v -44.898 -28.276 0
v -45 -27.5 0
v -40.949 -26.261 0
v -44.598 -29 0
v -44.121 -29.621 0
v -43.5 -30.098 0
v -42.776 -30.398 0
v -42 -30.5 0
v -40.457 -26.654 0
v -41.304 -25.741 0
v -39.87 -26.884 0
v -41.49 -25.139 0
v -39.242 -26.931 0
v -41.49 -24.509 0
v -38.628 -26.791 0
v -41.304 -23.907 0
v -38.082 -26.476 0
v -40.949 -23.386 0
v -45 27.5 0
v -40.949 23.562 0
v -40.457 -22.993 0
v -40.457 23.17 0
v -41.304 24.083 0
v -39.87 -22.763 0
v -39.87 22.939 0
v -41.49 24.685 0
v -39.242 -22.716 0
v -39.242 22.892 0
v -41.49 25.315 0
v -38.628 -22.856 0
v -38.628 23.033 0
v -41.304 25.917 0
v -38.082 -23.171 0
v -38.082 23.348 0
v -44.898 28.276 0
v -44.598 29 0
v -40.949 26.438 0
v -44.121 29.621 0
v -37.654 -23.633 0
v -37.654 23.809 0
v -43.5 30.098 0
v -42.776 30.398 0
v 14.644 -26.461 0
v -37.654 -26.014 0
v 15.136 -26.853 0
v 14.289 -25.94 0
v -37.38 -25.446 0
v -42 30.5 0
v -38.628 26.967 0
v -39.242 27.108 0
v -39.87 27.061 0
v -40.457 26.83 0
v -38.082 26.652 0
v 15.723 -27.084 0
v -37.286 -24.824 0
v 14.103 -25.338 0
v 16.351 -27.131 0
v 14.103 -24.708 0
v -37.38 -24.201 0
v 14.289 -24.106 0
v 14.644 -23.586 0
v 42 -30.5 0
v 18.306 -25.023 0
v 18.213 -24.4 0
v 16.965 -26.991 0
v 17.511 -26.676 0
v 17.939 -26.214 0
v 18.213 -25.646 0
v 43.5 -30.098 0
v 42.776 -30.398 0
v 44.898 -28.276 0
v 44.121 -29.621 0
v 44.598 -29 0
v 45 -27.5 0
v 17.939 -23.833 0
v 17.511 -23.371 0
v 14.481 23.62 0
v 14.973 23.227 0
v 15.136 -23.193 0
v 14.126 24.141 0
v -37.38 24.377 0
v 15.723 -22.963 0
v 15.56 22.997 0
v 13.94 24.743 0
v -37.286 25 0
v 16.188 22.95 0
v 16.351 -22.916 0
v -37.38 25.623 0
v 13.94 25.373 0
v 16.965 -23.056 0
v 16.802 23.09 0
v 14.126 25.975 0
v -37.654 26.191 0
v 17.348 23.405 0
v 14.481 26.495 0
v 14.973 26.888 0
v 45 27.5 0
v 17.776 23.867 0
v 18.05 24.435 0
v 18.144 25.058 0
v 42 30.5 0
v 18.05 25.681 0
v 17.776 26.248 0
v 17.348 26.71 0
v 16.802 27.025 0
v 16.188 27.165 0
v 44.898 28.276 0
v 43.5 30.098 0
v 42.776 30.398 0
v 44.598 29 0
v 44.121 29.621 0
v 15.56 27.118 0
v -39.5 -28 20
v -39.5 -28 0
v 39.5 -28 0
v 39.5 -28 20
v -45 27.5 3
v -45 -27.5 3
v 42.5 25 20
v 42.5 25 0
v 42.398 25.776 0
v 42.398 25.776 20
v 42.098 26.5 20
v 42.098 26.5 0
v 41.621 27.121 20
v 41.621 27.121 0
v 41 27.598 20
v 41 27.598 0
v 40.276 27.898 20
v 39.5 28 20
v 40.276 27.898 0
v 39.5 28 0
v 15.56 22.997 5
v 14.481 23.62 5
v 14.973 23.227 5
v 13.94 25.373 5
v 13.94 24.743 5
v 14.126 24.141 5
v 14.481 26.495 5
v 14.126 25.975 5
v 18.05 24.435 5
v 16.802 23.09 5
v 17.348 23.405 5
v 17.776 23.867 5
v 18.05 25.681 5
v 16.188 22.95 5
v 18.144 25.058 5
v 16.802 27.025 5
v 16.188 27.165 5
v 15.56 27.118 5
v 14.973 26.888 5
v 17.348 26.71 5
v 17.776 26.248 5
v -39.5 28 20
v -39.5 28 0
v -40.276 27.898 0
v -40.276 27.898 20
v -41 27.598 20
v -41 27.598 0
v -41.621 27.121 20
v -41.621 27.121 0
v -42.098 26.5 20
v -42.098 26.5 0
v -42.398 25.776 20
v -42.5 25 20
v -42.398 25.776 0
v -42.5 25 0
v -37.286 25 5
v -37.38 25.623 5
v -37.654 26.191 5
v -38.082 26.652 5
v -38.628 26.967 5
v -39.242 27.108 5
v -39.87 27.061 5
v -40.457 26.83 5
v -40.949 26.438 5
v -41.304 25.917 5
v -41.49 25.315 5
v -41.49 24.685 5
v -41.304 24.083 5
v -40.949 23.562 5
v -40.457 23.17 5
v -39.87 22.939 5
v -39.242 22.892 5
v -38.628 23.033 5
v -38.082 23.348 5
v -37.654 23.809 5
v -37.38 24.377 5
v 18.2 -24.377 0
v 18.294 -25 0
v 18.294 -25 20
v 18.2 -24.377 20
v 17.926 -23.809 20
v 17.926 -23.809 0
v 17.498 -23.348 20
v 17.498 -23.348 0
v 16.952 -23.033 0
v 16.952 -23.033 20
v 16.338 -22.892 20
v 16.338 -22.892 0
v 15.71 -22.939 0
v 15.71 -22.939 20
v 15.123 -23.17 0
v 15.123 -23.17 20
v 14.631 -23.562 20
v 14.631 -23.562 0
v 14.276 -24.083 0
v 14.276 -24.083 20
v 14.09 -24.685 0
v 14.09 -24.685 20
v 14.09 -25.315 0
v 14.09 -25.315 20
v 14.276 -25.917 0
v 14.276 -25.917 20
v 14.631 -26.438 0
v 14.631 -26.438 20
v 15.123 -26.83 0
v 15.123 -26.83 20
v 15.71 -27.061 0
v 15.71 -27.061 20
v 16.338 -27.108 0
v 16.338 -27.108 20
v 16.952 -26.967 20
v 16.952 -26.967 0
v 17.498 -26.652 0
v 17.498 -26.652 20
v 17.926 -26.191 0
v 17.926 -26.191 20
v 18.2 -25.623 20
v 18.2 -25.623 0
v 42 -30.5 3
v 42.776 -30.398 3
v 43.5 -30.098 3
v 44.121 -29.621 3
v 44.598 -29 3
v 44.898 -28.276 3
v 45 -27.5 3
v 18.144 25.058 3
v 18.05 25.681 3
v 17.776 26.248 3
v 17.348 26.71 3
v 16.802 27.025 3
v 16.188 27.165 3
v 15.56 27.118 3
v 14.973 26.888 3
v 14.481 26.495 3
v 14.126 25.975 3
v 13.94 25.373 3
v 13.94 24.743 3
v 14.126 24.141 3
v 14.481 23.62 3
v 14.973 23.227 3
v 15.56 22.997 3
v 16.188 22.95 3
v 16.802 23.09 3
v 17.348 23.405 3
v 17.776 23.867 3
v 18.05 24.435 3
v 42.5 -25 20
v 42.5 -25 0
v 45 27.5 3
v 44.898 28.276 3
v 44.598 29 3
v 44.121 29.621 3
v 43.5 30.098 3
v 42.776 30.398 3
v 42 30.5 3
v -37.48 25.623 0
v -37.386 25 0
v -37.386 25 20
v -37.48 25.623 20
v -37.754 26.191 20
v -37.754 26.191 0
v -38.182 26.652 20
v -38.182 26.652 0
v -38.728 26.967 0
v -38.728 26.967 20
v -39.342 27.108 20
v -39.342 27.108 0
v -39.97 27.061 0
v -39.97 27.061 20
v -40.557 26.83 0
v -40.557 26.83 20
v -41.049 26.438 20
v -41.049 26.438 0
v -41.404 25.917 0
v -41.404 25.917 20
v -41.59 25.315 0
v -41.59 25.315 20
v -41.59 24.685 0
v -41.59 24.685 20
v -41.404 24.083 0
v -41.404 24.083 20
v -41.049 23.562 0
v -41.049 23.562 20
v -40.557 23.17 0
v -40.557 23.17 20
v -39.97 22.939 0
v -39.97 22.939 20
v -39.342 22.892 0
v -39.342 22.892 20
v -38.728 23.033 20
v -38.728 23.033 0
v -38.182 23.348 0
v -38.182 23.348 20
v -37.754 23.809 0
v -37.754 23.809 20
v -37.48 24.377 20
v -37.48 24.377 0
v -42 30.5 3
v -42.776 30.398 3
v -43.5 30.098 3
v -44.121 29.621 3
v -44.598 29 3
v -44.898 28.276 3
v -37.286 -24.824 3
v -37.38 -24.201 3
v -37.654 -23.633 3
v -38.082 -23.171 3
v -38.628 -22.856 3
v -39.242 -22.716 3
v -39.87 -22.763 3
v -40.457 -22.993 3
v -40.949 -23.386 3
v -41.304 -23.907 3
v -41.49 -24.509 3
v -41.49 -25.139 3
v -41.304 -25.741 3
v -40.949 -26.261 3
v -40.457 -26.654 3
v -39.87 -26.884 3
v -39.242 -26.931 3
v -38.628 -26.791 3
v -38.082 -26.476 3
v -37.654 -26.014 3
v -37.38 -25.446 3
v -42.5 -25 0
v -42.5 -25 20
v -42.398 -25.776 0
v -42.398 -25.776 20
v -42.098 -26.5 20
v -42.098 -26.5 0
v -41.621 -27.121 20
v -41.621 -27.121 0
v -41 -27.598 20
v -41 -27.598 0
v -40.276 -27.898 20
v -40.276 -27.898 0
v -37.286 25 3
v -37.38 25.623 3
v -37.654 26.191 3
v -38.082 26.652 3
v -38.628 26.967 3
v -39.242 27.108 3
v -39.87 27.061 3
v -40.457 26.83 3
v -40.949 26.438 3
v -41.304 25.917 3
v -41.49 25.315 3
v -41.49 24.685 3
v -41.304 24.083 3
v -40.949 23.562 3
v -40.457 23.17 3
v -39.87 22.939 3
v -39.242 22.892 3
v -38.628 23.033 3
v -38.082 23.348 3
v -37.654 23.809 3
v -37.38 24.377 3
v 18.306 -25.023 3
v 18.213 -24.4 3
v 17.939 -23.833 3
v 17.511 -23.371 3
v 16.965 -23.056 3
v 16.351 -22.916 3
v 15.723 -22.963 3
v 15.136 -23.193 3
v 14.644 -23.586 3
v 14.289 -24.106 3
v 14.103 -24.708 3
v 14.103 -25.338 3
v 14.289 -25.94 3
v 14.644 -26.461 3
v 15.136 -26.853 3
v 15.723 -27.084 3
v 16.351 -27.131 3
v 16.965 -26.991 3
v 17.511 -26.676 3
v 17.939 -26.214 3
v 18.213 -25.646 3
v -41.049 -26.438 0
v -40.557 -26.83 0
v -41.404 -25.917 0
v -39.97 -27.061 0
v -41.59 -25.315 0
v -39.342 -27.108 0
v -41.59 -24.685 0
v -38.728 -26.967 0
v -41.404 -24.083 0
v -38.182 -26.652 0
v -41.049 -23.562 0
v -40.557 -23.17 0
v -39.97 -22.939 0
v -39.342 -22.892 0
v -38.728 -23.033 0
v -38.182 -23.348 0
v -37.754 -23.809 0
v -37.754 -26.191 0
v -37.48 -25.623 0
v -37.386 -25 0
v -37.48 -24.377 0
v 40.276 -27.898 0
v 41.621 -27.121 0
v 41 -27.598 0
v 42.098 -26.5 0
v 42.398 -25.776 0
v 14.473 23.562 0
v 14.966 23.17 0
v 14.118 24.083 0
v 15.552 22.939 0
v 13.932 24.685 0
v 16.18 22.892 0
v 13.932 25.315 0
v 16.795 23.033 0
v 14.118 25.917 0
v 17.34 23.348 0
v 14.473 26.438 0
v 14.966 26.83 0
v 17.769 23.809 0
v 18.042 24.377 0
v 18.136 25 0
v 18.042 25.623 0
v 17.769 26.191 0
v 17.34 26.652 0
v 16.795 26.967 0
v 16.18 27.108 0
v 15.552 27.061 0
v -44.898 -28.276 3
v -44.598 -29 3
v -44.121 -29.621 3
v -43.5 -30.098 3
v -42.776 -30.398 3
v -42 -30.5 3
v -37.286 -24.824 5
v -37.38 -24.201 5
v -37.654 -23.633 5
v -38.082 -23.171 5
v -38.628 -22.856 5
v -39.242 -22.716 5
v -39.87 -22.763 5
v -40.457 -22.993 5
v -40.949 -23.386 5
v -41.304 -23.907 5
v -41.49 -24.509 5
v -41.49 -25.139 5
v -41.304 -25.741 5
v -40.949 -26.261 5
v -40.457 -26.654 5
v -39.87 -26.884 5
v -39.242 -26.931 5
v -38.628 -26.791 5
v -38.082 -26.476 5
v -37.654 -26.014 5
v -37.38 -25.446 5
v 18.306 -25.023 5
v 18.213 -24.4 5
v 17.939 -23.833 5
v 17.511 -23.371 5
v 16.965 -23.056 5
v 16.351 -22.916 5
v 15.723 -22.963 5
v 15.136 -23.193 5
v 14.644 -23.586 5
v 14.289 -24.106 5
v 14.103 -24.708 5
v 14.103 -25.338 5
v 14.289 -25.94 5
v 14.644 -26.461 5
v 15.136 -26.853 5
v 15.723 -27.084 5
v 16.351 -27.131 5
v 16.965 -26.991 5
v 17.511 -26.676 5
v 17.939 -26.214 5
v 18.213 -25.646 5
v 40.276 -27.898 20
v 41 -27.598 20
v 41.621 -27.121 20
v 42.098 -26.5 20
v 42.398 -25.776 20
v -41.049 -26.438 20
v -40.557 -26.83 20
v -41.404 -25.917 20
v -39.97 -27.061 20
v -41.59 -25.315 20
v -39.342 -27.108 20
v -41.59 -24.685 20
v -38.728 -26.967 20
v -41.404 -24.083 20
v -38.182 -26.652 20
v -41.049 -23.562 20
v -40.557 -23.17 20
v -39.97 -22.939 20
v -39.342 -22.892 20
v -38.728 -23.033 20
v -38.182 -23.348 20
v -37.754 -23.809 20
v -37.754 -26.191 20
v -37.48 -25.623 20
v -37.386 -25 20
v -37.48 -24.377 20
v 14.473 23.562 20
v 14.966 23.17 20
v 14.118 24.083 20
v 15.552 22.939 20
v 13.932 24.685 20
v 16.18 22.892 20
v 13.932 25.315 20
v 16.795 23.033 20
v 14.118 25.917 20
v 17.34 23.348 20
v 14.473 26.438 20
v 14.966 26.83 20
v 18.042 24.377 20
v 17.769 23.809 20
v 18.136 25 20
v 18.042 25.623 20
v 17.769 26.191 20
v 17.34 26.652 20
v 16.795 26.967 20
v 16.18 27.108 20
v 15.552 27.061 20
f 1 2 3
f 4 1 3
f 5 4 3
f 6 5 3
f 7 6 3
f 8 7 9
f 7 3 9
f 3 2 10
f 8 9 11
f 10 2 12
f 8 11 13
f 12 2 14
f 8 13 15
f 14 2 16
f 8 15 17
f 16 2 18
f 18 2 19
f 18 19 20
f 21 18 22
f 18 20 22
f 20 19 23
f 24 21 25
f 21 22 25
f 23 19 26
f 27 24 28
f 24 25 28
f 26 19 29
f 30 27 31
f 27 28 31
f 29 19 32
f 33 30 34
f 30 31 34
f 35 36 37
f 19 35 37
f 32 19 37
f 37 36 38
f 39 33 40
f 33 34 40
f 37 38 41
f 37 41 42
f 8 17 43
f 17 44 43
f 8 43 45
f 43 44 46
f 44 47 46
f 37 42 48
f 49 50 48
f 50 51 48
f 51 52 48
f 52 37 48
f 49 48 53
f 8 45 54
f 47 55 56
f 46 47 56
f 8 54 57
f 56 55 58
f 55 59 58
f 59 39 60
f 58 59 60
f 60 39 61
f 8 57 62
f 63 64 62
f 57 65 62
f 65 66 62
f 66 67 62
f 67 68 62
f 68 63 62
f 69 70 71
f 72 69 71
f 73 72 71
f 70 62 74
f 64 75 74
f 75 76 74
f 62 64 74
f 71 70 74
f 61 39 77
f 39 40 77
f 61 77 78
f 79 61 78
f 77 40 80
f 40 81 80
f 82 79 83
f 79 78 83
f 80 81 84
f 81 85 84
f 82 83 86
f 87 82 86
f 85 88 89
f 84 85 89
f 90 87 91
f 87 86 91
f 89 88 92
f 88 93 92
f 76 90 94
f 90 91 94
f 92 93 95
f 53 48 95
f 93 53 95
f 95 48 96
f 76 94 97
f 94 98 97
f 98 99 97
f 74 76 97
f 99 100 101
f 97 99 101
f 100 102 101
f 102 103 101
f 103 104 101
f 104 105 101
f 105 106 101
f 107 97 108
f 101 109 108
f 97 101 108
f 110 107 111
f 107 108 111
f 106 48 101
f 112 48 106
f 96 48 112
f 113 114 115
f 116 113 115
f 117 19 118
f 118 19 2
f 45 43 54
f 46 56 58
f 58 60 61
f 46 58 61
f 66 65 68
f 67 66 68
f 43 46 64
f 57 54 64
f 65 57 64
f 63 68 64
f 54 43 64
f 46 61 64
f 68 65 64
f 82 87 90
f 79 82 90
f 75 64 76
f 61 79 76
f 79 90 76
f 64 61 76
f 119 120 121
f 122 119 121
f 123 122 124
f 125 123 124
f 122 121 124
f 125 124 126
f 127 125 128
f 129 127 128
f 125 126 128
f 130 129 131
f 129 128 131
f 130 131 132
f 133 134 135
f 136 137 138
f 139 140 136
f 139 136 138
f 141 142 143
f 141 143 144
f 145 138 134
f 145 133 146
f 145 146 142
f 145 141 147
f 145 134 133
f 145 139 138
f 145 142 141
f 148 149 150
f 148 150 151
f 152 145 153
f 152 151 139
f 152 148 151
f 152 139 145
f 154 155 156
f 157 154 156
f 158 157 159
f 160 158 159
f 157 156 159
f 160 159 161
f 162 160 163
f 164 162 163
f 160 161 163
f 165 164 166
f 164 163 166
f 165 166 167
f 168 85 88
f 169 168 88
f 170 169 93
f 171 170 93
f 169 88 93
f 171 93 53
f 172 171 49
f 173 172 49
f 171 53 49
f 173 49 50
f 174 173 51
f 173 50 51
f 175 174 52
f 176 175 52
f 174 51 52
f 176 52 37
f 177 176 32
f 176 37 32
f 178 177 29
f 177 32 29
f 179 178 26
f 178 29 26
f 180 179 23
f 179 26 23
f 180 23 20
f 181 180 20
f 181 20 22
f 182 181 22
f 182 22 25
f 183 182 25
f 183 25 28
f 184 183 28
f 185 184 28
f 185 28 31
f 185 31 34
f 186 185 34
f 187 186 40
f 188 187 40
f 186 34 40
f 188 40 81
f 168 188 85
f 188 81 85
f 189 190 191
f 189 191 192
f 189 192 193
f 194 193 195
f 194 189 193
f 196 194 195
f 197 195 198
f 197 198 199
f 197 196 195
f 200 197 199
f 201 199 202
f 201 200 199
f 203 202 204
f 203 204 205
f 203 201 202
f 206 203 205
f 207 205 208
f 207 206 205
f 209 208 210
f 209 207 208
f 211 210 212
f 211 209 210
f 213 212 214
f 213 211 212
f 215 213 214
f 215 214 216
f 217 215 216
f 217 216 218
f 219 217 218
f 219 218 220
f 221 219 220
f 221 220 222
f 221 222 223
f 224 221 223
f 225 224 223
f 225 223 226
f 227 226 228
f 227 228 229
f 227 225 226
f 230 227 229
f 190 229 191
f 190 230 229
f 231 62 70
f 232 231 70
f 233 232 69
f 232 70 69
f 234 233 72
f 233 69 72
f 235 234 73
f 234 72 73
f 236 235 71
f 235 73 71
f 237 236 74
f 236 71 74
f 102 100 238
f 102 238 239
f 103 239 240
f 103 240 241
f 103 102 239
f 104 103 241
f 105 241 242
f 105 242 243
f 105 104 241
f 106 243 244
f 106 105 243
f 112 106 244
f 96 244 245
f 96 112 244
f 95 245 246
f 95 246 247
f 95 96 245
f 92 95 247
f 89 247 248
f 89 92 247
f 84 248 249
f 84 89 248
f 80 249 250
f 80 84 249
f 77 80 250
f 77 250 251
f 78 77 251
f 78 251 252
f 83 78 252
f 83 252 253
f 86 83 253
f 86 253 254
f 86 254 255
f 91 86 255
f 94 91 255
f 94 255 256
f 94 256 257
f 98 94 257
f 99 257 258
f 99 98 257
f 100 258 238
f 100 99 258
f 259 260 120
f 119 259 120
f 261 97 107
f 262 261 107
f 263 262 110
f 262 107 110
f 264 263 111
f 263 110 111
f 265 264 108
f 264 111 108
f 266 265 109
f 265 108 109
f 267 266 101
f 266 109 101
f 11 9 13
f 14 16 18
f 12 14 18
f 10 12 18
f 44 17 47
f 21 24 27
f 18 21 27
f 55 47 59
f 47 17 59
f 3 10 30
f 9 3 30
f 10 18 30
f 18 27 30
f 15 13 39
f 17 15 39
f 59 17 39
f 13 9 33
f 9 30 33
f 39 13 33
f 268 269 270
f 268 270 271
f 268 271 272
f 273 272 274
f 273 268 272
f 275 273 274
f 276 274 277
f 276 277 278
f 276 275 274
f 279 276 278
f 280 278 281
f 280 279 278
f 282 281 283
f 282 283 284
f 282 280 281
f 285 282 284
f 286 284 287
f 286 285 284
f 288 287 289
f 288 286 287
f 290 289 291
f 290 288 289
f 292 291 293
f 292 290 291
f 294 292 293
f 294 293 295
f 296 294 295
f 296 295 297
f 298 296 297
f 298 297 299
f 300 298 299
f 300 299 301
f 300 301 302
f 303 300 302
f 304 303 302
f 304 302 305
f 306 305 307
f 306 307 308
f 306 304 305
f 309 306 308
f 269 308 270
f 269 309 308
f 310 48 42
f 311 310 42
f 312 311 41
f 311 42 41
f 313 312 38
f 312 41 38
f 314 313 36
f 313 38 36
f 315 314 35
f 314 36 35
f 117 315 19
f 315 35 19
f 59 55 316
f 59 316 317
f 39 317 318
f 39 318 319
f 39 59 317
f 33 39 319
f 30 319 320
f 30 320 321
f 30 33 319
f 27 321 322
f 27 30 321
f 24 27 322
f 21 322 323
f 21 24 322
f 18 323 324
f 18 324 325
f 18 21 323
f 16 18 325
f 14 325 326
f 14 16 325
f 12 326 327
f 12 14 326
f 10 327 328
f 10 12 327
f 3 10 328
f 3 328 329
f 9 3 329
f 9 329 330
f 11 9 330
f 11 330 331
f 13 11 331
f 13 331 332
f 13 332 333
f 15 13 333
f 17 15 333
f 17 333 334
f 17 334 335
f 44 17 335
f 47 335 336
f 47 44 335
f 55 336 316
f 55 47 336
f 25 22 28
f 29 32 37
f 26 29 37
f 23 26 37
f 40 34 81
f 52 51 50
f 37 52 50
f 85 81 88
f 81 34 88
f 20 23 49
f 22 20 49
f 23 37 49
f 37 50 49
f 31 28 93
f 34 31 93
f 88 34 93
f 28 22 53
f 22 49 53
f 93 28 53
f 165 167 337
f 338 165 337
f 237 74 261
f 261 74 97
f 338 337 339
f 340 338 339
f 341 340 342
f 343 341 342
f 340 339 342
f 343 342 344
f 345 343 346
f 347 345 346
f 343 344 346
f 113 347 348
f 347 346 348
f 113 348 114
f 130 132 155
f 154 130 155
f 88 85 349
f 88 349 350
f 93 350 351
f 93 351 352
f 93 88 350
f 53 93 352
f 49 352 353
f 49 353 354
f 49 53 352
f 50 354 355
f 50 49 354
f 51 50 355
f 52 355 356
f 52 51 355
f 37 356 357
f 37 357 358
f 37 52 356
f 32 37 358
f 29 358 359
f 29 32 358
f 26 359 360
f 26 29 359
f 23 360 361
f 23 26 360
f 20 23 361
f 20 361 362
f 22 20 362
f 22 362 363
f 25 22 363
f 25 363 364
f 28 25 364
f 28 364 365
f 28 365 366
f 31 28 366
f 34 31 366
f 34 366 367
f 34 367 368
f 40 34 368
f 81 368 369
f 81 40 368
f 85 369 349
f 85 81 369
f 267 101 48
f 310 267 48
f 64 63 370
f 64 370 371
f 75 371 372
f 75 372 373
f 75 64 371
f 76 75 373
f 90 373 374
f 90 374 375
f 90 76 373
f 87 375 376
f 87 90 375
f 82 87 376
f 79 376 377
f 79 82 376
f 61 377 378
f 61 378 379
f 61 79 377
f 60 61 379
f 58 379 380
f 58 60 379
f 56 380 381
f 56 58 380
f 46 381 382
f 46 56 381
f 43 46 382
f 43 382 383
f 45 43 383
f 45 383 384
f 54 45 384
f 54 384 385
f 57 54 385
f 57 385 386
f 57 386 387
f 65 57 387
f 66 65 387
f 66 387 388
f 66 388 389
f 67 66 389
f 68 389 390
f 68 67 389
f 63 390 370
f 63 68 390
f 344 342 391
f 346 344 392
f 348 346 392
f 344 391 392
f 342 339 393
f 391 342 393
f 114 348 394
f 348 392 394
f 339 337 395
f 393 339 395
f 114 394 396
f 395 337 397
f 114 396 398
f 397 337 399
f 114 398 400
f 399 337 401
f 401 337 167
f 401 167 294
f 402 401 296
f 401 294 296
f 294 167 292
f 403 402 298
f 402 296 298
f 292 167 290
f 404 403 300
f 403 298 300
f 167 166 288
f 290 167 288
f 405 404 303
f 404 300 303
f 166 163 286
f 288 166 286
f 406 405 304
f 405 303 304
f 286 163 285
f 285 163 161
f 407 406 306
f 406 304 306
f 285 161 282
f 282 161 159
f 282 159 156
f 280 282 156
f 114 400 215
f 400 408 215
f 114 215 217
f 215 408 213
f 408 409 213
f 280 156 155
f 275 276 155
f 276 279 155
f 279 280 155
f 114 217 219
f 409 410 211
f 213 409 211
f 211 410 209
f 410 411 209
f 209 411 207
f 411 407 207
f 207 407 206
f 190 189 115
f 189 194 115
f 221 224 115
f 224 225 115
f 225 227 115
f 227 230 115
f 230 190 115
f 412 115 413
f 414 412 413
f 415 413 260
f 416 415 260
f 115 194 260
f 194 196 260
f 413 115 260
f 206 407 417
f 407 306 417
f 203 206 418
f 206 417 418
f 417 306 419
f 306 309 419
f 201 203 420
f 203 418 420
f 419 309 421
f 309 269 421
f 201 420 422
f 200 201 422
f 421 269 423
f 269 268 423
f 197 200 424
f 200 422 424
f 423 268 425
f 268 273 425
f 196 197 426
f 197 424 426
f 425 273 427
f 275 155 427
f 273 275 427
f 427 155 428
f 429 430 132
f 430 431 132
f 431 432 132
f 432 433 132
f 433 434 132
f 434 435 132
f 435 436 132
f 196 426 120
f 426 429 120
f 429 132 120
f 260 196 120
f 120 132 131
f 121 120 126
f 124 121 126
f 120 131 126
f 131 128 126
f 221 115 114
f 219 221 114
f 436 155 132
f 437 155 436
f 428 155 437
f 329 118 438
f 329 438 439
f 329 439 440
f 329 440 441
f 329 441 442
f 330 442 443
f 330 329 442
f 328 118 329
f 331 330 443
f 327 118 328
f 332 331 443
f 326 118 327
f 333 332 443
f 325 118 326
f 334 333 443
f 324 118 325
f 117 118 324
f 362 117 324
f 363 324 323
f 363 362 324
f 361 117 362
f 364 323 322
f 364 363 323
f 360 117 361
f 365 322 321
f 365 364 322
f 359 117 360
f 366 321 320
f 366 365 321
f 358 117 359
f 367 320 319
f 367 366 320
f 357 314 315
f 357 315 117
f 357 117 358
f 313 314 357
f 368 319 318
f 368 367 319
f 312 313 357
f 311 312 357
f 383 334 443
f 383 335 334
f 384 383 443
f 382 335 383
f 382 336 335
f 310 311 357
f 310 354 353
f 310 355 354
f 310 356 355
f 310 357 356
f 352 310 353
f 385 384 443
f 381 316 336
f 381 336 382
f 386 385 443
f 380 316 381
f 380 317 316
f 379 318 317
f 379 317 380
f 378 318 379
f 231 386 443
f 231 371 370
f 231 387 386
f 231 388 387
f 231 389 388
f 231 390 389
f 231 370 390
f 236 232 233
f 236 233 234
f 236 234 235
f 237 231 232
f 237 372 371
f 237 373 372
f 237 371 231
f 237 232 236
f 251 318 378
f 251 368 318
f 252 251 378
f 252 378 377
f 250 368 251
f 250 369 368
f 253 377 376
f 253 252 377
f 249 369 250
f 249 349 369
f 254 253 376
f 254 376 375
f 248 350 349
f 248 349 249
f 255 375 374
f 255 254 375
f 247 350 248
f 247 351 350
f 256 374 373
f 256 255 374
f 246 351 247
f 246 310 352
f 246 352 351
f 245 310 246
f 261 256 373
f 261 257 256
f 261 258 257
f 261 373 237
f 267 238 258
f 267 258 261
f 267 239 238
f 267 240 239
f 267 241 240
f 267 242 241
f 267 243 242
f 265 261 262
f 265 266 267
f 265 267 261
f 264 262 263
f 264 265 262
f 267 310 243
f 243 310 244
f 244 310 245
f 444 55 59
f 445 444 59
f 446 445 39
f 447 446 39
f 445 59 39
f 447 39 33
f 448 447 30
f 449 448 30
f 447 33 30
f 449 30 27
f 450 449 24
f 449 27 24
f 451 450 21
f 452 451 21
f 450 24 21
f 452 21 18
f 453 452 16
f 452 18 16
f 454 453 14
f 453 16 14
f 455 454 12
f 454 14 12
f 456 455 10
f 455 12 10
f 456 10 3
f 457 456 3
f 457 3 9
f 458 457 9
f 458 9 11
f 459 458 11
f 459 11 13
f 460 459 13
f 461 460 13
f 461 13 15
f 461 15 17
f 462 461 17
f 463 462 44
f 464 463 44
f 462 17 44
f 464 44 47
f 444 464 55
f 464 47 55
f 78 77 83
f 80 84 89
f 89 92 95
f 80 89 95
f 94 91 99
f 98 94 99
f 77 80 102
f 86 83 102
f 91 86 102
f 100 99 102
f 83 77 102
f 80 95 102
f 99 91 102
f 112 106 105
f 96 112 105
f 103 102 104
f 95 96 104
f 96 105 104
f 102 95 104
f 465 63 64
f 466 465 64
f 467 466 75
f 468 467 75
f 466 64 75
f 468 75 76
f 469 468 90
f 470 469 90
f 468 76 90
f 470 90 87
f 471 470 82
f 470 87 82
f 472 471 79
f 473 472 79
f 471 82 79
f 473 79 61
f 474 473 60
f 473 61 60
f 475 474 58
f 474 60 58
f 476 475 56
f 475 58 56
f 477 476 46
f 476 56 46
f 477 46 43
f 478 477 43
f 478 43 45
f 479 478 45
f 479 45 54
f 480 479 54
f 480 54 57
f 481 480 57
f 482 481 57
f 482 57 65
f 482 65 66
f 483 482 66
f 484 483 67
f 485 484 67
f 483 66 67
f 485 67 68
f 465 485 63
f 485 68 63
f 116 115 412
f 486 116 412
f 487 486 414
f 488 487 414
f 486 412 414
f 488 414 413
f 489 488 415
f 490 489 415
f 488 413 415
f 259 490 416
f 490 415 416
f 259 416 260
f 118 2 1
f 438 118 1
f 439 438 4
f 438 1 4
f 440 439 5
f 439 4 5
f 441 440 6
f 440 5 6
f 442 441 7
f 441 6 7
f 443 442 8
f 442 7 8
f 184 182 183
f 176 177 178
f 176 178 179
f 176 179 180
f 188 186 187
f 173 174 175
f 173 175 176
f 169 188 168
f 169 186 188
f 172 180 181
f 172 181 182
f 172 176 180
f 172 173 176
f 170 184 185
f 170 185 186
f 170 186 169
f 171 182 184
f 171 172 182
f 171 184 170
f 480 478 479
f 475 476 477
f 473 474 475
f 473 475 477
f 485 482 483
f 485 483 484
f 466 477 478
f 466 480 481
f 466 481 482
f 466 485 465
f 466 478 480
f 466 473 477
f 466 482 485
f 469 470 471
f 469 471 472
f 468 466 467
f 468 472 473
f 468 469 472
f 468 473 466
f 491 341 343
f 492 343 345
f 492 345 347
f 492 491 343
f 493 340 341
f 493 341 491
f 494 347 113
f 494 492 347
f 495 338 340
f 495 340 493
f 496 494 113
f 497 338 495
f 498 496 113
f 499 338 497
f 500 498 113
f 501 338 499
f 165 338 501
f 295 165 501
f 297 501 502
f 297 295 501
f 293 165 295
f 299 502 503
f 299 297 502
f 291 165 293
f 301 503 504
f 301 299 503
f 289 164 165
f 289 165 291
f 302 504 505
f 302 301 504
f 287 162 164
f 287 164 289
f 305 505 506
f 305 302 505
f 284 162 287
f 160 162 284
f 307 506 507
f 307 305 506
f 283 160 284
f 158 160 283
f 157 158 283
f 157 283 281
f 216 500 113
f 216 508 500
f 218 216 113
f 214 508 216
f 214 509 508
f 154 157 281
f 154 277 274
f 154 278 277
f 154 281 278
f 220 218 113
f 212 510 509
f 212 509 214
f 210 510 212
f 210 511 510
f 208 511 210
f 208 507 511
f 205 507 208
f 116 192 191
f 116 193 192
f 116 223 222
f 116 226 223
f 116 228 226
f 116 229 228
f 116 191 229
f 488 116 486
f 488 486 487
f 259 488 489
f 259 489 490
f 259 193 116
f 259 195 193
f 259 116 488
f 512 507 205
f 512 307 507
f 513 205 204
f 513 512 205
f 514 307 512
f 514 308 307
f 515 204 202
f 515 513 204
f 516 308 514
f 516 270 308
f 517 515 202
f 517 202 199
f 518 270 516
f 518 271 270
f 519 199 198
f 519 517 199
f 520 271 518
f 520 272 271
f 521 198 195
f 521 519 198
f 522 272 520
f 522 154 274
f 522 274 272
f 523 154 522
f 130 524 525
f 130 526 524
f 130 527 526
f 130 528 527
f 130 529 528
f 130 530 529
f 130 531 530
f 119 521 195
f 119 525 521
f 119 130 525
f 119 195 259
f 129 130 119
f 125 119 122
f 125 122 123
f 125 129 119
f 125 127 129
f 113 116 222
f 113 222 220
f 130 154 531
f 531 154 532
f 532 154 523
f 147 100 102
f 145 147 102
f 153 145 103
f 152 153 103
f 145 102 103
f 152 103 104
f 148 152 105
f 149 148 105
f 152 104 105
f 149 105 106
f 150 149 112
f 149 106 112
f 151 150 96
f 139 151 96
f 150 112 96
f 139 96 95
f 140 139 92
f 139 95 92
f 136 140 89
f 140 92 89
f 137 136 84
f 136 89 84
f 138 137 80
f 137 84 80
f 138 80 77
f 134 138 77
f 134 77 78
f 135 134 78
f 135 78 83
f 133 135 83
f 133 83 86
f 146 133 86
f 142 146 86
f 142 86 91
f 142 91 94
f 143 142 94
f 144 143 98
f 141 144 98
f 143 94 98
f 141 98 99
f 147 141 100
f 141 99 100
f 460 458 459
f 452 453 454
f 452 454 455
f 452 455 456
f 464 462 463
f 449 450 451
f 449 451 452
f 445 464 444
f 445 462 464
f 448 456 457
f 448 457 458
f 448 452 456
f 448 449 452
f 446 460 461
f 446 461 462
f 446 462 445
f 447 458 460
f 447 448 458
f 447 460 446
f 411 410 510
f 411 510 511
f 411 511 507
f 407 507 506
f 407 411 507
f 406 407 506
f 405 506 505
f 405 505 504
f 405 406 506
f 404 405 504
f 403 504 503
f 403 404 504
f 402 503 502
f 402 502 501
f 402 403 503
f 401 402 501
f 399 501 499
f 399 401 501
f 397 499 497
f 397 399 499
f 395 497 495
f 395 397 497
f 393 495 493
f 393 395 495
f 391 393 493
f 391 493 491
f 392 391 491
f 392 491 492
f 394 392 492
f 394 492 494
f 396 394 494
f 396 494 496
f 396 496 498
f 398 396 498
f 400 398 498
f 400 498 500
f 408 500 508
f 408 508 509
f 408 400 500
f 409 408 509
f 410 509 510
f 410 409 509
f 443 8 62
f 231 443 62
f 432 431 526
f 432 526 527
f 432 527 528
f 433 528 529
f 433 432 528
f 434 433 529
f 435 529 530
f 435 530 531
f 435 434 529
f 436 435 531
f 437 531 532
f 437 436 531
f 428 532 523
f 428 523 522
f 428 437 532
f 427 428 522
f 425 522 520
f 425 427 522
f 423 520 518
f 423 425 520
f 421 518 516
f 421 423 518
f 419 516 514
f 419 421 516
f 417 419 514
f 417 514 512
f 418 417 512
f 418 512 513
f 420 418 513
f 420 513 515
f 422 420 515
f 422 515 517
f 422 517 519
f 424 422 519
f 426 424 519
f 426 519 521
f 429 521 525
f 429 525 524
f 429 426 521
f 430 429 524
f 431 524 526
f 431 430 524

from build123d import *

# Parameters (mm, degrees)
F0_R     = 2.113509
F1_DEPTH = 20
F2_R     = 2.113509
F3_DEPTH = 5
F4_DEPTH = 3


with BuildPart() as f1:
    # F0 (on Top) → F1 (new body)
    with BuildSketch(Plane.XY):
        with BuildLine():
            ThreePointArc((-42.5, -25), (-41.62132, -27.12132), (-39.5, -28))
            Line((-39.5, -28), (39.5, -28))
            ThreePointArc((39.5, -28), (41.62132, -27.12132), (42.5, -25))
            Line((42.5, -25), (42.5, 25))
            ThreePointArc((42.5, 25), (41.62132, 27.12132), (39.5, 28))
            Line((39.5, 28), (-39.5, 28))
            ThreePointArc((-39.5, 28), (-41.62132, 27.12132), (-42.5, 25))
            Line((-42.5, 25), (-42.5, -25))
        make_face()
        with Locations((-39.5, -25)):
            Circle(F0_R, mode=Mode.SUBTRACT)
        with Locations((16.180091, -25)):
            Circle(F0_R, mode=Mode.SUBTRACT)
        with Locations((-39.5, 25)):
            Circle(F0_R, mode=Mode.SUBTRACT)
        with Locations((16.022362, 25)):
            Circle(F0_R, mode=Mode.SUBTRACT)
    extrude(amount=F1_DEPTH)


with BuildPart() as f3:
    # F2 (on Top) → F3 (new body)
    with BuildSketch(Plane.XY):
        with Locations((-39.399996, -24.823522)):
            Circle(F2_R)
        with Locations((16.030002, 25.057763)):
            Circle(F2_R)
        with Locations((16.192948, -25.023146)):
            Circle(F2_R)
        with Locations((-39.4, 24.999997)):
            Circle(F2_R)
    extrude(amount=F3_DEPTH)


with BuildPart() as f4:
    # F2 (on Top) → F4 (new body)
    with BuildSketch(Plane.XY):
        with BuildLine():
            ThreePointArc((45, 27.5), (44.12132, 29.62132), (42, 30.5))
            Line((42, 30.5), (-42, 30.5))
            ThreePointArc((-42, 30.5), (-44.12132, 29.62132), (-45, 27.5))
            Line((-45, 27.5), (-45, -27.5))
            ThreePointArc((-45, -27.5), (-44.12132, -29.62132), (-42, -30.5))
            Line((-42, -30.5), (42, -30.5))
            ThreePointArc((42, -30.5), (44.12132, -29.62132), (45, -27.5))
            Line((45, -27.5), (45, 27.5))
        make_face()
        with Locations((-39.399996, -24.823522)):
            Circle(F2_R, mode=Mode.SUBTRACT)
        with Locations((16.192948, -25.023146)):
            Circle(F2_R, mode=Mode.SUBTRACT)
        with Locations((-39.4, 24.999997)):
            Circle(F2_R, mode=Mode.SUBTRACT)
        with Locations((16.030002, 25.057763)):
            Circle(F2_R, mode=Mode.SUBTRACT)
    extrude(amount=F4_DEPTH)


solid = Compound([f1.part, f3.part, f4.part])
